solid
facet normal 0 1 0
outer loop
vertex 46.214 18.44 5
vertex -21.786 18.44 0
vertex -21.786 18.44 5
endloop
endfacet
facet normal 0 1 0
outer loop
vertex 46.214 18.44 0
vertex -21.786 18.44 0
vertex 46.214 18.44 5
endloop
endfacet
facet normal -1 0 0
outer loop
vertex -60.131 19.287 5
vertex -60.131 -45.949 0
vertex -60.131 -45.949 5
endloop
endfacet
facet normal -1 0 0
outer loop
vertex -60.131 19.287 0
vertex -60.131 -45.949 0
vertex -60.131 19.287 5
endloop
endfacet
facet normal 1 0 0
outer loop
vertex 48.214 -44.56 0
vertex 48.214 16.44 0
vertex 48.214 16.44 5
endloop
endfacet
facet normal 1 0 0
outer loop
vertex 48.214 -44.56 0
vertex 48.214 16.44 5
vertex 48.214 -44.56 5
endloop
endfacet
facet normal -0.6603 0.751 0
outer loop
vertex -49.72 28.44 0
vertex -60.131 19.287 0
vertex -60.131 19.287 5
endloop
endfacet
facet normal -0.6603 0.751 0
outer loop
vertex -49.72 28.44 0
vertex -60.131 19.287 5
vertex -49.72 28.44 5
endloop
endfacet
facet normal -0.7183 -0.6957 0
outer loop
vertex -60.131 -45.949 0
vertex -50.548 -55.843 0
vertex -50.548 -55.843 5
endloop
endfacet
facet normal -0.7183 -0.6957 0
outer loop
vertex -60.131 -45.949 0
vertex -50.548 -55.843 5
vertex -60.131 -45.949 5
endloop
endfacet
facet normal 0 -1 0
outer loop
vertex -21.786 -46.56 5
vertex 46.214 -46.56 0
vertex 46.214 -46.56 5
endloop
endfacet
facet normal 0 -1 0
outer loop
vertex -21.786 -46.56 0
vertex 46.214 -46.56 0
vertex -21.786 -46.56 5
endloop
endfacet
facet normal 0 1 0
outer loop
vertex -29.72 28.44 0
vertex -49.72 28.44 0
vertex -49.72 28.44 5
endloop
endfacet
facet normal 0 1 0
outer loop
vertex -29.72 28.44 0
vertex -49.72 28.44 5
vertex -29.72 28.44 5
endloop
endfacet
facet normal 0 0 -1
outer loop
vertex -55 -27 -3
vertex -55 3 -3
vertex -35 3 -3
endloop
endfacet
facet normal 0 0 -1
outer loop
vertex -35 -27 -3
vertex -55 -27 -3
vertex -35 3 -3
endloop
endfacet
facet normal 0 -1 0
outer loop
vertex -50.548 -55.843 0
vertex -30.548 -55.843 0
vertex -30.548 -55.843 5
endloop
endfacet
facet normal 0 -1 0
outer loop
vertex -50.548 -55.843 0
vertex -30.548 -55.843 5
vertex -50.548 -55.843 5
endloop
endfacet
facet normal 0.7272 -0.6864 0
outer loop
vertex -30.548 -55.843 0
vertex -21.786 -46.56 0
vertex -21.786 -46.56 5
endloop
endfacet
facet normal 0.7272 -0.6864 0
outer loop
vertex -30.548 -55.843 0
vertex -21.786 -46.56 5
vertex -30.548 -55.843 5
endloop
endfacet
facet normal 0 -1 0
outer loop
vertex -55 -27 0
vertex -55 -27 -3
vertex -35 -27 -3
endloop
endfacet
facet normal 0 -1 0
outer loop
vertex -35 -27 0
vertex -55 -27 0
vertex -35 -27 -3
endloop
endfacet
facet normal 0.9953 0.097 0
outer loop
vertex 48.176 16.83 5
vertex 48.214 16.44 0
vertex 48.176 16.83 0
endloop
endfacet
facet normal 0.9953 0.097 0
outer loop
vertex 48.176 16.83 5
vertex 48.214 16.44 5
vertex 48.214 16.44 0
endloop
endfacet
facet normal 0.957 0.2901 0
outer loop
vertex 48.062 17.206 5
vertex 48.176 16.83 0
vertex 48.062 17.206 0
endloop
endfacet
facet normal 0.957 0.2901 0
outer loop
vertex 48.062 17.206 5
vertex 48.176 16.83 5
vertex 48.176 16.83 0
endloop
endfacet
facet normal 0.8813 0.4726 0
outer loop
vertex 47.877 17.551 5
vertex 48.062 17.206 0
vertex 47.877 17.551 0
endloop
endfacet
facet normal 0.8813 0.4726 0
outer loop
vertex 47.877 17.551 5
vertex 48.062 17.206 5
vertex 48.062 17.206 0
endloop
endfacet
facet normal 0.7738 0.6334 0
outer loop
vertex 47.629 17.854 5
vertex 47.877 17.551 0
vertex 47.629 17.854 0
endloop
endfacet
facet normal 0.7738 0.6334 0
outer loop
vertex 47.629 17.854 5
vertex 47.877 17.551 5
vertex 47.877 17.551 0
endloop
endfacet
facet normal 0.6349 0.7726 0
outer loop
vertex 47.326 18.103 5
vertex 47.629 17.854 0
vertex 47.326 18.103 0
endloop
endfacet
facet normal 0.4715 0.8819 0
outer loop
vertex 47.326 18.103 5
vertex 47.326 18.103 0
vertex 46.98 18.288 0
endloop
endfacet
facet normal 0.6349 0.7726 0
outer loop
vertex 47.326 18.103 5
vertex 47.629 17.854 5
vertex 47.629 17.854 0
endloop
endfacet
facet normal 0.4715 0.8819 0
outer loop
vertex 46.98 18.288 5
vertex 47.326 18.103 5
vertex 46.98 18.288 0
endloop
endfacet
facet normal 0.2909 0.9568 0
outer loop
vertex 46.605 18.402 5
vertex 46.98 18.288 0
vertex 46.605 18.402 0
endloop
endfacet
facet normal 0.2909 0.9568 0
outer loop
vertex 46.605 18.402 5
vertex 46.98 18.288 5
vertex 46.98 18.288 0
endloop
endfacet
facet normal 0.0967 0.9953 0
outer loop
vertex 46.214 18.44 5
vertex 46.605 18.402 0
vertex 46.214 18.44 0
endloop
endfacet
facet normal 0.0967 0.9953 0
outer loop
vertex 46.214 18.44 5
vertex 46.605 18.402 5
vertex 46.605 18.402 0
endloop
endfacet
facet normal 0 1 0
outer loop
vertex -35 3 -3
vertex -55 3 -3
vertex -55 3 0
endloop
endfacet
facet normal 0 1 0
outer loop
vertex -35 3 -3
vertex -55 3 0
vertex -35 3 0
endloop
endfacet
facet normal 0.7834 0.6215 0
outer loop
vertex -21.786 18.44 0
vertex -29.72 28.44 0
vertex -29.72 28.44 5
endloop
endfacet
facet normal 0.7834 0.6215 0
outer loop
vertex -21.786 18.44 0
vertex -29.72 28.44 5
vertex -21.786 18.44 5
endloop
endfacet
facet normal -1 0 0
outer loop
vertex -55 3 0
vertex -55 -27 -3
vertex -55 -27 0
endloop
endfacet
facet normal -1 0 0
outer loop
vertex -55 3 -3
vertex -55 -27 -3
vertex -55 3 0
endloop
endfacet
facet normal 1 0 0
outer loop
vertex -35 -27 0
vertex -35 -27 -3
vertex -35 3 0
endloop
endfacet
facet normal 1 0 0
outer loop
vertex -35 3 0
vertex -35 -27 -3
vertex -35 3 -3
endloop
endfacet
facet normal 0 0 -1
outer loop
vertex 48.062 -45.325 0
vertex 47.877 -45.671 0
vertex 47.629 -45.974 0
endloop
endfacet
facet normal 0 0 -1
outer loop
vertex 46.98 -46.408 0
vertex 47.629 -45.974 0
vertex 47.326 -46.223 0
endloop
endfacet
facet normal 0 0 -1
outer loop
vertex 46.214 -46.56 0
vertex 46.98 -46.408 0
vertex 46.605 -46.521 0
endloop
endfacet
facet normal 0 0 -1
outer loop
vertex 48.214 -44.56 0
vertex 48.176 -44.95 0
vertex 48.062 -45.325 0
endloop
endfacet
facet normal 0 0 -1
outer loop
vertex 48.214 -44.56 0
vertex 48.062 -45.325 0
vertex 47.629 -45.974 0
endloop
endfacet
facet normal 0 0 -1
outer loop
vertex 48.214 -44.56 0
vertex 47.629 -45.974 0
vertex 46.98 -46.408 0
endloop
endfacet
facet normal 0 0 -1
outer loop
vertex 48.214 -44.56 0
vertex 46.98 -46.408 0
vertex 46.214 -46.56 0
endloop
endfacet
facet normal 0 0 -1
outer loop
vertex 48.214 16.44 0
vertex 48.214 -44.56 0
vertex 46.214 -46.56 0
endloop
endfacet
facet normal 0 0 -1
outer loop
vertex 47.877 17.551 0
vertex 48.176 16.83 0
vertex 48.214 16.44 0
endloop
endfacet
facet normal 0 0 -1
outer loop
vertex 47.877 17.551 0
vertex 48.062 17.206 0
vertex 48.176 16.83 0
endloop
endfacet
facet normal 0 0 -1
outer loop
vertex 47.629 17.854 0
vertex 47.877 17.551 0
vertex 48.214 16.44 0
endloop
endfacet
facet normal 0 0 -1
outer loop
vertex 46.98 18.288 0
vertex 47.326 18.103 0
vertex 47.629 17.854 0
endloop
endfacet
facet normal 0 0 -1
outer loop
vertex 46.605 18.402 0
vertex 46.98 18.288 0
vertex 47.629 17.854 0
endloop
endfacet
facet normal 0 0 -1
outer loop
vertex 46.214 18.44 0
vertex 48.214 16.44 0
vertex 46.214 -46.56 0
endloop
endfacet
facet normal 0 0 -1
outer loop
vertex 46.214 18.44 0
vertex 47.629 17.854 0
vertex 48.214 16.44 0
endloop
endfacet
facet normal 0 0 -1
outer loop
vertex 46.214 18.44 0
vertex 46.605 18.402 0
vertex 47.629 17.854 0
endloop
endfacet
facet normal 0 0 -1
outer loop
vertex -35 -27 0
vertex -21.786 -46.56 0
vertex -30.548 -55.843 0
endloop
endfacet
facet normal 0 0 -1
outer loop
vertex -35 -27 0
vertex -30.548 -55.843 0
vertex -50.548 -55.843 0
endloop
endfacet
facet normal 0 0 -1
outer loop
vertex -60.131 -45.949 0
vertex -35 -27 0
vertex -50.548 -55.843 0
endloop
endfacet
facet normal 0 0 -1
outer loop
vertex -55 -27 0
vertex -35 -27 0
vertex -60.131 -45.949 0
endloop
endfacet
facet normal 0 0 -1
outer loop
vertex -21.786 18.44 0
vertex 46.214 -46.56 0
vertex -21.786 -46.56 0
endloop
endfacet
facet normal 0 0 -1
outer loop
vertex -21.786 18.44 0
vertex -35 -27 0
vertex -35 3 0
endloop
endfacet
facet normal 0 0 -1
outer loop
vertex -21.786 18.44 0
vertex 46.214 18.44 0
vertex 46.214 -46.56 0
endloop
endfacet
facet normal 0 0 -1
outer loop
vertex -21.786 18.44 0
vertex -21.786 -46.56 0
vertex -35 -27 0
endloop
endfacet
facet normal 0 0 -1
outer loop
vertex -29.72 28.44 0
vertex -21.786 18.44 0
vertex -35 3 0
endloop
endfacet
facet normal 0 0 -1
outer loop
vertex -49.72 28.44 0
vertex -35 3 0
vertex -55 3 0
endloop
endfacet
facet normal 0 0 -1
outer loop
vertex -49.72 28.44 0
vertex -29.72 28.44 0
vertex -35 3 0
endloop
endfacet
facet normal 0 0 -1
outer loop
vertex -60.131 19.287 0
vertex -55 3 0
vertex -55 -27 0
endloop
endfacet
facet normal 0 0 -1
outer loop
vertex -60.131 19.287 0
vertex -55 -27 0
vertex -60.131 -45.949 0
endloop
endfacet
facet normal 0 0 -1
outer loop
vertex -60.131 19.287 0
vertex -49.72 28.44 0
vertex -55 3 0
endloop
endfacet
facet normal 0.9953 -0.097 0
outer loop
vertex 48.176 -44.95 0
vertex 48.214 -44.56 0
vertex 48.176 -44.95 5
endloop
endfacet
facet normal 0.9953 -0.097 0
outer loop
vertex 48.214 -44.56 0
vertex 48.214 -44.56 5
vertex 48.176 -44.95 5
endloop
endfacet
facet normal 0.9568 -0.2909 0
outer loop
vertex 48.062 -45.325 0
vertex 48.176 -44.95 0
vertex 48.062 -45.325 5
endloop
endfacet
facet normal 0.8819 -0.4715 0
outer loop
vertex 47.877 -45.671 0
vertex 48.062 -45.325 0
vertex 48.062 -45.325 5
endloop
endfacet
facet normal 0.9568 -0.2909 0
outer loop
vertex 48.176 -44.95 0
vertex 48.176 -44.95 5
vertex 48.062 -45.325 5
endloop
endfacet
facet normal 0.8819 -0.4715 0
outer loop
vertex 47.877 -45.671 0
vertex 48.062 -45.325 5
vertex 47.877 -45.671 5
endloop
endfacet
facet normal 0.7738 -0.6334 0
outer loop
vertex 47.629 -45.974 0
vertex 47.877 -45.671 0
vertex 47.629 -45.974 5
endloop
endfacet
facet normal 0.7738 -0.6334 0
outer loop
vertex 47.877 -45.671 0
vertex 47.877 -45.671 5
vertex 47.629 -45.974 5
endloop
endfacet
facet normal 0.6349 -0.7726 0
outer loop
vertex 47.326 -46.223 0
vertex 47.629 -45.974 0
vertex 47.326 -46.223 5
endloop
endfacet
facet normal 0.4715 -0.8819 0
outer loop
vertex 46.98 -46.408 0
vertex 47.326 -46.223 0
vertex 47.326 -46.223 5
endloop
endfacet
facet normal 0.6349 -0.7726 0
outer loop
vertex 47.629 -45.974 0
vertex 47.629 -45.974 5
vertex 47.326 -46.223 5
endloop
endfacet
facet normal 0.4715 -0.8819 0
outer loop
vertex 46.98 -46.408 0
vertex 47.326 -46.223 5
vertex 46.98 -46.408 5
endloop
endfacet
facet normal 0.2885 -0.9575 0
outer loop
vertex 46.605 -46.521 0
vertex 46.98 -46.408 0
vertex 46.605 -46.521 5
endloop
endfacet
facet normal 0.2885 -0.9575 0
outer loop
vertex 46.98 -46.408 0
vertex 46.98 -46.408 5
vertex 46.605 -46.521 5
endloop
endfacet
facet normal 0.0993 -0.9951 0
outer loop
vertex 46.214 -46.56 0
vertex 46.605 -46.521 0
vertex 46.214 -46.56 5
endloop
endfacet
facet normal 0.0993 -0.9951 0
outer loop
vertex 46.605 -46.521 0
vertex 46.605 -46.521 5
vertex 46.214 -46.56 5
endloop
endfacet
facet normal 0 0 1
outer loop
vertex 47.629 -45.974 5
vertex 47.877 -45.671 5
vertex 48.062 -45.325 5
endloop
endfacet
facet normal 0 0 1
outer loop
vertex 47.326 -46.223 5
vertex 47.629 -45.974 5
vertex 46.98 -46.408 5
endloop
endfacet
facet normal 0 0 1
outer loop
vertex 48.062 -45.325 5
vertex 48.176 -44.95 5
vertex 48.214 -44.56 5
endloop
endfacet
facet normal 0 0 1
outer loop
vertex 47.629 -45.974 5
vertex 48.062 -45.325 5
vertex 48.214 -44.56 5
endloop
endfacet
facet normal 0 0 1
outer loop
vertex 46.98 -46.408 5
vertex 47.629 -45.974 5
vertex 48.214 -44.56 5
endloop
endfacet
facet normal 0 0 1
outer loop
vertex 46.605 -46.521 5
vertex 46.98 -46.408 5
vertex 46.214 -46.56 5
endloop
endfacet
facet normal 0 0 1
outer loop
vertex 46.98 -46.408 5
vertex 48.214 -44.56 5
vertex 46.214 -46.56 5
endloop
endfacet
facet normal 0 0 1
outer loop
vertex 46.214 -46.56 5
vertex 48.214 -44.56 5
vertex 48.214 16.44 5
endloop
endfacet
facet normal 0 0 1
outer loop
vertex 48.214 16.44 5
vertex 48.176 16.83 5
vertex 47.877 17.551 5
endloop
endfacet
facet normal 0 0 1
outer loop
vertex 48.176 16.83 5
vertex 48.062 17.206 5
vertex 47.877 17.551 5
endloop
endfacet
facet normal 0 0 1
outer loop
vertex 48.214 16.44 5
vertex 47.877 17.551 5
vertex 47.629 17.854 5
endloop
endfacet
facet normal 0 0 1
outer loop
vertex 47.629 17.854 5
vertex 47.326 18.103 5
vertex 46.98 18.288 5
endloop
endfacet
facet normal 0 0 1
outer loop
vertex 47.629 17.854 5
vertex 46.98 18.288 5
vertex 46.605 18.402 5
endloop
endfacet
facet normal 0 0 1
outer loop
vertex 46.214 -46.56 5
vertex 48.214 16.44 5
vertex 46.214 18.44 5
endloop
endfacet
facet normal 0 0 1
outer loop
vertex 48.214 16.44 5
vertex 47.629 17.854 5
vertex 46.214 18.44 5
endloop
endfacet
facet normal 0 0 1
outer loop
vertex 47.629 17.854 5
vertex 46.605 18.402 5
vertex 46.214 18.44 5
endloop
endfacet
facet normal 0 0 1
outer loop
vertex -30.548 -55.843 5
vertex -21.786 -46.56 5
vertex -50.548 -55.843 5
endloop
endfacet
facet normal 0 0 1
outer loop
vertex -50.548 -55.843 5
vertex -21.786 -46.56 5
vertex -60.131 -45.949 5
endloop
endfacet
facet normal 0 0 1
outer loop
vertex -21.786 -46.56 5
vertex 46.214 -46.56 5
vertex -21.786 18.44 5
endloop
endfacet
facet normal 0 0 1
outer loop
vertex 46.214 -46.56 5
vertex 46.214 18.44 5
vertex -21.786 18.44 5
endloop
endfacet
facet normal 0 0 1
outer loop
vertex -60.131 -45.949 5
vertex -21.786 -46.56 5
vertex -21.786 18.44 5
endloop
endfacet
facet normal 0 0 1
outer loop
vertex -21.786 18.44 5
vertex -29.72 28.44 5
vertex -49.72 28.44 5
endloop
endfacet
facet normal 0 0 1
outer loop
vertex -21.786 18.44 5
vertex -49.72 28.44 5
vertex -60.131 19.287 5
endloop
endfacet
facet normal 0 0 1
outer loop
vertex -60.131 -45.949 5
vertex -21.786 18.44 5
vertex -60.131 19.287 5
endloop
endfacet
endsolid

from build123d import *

# Parameters (mm, degrees)
BOX_W     = 20
BOX_H     = 30
BOX_DEPTH = 3
PAD_DEPTH = 5
FILLET_R  = 2


with BuildPart() as cubo:
    # Box → Box (new body)
    with BuildSketch(Plane(origin=(-55, -27, -3), x_dir=(1, 0, 0), z_dir=(0, 0, 1))):
        with Locations((10, 15)):
            Rectangle(BOX_W, BOX_H)
    extrude(amount=BOX_DEPTH)


with BuildPart() as fillet_body:
    # Sketch → Pad (new body)
    with BuildSketch(Plane.XY):
        Polygon((48.214441, 18.44022), (48.214441, -46.55978), (-21.785559, -46.55978), (-30.548117, -55.842846), (-50.548117, -55.842846), (-60.130928, -45.949108), (-60.130928, 19.287283), (-49.72015, 28.44022), (-29.72015, 28.44022), (-21.785559, 18.44022), align=None)
    extrude(amount=PAD_DEPTH)

    # Fusion: union Cubo
    add(cubo.part)

    # Fillet
    fillet_edges = [fillet_body.edges().sort_by_distance(p)[0] for p in [
        (48.214441, 18.44022, 2.5),
        (48.214441, -46.55978, 2.5),
    ]]
    fillet(fillet_edges, radius=FILLET_R)


solid = fillet_body.part
